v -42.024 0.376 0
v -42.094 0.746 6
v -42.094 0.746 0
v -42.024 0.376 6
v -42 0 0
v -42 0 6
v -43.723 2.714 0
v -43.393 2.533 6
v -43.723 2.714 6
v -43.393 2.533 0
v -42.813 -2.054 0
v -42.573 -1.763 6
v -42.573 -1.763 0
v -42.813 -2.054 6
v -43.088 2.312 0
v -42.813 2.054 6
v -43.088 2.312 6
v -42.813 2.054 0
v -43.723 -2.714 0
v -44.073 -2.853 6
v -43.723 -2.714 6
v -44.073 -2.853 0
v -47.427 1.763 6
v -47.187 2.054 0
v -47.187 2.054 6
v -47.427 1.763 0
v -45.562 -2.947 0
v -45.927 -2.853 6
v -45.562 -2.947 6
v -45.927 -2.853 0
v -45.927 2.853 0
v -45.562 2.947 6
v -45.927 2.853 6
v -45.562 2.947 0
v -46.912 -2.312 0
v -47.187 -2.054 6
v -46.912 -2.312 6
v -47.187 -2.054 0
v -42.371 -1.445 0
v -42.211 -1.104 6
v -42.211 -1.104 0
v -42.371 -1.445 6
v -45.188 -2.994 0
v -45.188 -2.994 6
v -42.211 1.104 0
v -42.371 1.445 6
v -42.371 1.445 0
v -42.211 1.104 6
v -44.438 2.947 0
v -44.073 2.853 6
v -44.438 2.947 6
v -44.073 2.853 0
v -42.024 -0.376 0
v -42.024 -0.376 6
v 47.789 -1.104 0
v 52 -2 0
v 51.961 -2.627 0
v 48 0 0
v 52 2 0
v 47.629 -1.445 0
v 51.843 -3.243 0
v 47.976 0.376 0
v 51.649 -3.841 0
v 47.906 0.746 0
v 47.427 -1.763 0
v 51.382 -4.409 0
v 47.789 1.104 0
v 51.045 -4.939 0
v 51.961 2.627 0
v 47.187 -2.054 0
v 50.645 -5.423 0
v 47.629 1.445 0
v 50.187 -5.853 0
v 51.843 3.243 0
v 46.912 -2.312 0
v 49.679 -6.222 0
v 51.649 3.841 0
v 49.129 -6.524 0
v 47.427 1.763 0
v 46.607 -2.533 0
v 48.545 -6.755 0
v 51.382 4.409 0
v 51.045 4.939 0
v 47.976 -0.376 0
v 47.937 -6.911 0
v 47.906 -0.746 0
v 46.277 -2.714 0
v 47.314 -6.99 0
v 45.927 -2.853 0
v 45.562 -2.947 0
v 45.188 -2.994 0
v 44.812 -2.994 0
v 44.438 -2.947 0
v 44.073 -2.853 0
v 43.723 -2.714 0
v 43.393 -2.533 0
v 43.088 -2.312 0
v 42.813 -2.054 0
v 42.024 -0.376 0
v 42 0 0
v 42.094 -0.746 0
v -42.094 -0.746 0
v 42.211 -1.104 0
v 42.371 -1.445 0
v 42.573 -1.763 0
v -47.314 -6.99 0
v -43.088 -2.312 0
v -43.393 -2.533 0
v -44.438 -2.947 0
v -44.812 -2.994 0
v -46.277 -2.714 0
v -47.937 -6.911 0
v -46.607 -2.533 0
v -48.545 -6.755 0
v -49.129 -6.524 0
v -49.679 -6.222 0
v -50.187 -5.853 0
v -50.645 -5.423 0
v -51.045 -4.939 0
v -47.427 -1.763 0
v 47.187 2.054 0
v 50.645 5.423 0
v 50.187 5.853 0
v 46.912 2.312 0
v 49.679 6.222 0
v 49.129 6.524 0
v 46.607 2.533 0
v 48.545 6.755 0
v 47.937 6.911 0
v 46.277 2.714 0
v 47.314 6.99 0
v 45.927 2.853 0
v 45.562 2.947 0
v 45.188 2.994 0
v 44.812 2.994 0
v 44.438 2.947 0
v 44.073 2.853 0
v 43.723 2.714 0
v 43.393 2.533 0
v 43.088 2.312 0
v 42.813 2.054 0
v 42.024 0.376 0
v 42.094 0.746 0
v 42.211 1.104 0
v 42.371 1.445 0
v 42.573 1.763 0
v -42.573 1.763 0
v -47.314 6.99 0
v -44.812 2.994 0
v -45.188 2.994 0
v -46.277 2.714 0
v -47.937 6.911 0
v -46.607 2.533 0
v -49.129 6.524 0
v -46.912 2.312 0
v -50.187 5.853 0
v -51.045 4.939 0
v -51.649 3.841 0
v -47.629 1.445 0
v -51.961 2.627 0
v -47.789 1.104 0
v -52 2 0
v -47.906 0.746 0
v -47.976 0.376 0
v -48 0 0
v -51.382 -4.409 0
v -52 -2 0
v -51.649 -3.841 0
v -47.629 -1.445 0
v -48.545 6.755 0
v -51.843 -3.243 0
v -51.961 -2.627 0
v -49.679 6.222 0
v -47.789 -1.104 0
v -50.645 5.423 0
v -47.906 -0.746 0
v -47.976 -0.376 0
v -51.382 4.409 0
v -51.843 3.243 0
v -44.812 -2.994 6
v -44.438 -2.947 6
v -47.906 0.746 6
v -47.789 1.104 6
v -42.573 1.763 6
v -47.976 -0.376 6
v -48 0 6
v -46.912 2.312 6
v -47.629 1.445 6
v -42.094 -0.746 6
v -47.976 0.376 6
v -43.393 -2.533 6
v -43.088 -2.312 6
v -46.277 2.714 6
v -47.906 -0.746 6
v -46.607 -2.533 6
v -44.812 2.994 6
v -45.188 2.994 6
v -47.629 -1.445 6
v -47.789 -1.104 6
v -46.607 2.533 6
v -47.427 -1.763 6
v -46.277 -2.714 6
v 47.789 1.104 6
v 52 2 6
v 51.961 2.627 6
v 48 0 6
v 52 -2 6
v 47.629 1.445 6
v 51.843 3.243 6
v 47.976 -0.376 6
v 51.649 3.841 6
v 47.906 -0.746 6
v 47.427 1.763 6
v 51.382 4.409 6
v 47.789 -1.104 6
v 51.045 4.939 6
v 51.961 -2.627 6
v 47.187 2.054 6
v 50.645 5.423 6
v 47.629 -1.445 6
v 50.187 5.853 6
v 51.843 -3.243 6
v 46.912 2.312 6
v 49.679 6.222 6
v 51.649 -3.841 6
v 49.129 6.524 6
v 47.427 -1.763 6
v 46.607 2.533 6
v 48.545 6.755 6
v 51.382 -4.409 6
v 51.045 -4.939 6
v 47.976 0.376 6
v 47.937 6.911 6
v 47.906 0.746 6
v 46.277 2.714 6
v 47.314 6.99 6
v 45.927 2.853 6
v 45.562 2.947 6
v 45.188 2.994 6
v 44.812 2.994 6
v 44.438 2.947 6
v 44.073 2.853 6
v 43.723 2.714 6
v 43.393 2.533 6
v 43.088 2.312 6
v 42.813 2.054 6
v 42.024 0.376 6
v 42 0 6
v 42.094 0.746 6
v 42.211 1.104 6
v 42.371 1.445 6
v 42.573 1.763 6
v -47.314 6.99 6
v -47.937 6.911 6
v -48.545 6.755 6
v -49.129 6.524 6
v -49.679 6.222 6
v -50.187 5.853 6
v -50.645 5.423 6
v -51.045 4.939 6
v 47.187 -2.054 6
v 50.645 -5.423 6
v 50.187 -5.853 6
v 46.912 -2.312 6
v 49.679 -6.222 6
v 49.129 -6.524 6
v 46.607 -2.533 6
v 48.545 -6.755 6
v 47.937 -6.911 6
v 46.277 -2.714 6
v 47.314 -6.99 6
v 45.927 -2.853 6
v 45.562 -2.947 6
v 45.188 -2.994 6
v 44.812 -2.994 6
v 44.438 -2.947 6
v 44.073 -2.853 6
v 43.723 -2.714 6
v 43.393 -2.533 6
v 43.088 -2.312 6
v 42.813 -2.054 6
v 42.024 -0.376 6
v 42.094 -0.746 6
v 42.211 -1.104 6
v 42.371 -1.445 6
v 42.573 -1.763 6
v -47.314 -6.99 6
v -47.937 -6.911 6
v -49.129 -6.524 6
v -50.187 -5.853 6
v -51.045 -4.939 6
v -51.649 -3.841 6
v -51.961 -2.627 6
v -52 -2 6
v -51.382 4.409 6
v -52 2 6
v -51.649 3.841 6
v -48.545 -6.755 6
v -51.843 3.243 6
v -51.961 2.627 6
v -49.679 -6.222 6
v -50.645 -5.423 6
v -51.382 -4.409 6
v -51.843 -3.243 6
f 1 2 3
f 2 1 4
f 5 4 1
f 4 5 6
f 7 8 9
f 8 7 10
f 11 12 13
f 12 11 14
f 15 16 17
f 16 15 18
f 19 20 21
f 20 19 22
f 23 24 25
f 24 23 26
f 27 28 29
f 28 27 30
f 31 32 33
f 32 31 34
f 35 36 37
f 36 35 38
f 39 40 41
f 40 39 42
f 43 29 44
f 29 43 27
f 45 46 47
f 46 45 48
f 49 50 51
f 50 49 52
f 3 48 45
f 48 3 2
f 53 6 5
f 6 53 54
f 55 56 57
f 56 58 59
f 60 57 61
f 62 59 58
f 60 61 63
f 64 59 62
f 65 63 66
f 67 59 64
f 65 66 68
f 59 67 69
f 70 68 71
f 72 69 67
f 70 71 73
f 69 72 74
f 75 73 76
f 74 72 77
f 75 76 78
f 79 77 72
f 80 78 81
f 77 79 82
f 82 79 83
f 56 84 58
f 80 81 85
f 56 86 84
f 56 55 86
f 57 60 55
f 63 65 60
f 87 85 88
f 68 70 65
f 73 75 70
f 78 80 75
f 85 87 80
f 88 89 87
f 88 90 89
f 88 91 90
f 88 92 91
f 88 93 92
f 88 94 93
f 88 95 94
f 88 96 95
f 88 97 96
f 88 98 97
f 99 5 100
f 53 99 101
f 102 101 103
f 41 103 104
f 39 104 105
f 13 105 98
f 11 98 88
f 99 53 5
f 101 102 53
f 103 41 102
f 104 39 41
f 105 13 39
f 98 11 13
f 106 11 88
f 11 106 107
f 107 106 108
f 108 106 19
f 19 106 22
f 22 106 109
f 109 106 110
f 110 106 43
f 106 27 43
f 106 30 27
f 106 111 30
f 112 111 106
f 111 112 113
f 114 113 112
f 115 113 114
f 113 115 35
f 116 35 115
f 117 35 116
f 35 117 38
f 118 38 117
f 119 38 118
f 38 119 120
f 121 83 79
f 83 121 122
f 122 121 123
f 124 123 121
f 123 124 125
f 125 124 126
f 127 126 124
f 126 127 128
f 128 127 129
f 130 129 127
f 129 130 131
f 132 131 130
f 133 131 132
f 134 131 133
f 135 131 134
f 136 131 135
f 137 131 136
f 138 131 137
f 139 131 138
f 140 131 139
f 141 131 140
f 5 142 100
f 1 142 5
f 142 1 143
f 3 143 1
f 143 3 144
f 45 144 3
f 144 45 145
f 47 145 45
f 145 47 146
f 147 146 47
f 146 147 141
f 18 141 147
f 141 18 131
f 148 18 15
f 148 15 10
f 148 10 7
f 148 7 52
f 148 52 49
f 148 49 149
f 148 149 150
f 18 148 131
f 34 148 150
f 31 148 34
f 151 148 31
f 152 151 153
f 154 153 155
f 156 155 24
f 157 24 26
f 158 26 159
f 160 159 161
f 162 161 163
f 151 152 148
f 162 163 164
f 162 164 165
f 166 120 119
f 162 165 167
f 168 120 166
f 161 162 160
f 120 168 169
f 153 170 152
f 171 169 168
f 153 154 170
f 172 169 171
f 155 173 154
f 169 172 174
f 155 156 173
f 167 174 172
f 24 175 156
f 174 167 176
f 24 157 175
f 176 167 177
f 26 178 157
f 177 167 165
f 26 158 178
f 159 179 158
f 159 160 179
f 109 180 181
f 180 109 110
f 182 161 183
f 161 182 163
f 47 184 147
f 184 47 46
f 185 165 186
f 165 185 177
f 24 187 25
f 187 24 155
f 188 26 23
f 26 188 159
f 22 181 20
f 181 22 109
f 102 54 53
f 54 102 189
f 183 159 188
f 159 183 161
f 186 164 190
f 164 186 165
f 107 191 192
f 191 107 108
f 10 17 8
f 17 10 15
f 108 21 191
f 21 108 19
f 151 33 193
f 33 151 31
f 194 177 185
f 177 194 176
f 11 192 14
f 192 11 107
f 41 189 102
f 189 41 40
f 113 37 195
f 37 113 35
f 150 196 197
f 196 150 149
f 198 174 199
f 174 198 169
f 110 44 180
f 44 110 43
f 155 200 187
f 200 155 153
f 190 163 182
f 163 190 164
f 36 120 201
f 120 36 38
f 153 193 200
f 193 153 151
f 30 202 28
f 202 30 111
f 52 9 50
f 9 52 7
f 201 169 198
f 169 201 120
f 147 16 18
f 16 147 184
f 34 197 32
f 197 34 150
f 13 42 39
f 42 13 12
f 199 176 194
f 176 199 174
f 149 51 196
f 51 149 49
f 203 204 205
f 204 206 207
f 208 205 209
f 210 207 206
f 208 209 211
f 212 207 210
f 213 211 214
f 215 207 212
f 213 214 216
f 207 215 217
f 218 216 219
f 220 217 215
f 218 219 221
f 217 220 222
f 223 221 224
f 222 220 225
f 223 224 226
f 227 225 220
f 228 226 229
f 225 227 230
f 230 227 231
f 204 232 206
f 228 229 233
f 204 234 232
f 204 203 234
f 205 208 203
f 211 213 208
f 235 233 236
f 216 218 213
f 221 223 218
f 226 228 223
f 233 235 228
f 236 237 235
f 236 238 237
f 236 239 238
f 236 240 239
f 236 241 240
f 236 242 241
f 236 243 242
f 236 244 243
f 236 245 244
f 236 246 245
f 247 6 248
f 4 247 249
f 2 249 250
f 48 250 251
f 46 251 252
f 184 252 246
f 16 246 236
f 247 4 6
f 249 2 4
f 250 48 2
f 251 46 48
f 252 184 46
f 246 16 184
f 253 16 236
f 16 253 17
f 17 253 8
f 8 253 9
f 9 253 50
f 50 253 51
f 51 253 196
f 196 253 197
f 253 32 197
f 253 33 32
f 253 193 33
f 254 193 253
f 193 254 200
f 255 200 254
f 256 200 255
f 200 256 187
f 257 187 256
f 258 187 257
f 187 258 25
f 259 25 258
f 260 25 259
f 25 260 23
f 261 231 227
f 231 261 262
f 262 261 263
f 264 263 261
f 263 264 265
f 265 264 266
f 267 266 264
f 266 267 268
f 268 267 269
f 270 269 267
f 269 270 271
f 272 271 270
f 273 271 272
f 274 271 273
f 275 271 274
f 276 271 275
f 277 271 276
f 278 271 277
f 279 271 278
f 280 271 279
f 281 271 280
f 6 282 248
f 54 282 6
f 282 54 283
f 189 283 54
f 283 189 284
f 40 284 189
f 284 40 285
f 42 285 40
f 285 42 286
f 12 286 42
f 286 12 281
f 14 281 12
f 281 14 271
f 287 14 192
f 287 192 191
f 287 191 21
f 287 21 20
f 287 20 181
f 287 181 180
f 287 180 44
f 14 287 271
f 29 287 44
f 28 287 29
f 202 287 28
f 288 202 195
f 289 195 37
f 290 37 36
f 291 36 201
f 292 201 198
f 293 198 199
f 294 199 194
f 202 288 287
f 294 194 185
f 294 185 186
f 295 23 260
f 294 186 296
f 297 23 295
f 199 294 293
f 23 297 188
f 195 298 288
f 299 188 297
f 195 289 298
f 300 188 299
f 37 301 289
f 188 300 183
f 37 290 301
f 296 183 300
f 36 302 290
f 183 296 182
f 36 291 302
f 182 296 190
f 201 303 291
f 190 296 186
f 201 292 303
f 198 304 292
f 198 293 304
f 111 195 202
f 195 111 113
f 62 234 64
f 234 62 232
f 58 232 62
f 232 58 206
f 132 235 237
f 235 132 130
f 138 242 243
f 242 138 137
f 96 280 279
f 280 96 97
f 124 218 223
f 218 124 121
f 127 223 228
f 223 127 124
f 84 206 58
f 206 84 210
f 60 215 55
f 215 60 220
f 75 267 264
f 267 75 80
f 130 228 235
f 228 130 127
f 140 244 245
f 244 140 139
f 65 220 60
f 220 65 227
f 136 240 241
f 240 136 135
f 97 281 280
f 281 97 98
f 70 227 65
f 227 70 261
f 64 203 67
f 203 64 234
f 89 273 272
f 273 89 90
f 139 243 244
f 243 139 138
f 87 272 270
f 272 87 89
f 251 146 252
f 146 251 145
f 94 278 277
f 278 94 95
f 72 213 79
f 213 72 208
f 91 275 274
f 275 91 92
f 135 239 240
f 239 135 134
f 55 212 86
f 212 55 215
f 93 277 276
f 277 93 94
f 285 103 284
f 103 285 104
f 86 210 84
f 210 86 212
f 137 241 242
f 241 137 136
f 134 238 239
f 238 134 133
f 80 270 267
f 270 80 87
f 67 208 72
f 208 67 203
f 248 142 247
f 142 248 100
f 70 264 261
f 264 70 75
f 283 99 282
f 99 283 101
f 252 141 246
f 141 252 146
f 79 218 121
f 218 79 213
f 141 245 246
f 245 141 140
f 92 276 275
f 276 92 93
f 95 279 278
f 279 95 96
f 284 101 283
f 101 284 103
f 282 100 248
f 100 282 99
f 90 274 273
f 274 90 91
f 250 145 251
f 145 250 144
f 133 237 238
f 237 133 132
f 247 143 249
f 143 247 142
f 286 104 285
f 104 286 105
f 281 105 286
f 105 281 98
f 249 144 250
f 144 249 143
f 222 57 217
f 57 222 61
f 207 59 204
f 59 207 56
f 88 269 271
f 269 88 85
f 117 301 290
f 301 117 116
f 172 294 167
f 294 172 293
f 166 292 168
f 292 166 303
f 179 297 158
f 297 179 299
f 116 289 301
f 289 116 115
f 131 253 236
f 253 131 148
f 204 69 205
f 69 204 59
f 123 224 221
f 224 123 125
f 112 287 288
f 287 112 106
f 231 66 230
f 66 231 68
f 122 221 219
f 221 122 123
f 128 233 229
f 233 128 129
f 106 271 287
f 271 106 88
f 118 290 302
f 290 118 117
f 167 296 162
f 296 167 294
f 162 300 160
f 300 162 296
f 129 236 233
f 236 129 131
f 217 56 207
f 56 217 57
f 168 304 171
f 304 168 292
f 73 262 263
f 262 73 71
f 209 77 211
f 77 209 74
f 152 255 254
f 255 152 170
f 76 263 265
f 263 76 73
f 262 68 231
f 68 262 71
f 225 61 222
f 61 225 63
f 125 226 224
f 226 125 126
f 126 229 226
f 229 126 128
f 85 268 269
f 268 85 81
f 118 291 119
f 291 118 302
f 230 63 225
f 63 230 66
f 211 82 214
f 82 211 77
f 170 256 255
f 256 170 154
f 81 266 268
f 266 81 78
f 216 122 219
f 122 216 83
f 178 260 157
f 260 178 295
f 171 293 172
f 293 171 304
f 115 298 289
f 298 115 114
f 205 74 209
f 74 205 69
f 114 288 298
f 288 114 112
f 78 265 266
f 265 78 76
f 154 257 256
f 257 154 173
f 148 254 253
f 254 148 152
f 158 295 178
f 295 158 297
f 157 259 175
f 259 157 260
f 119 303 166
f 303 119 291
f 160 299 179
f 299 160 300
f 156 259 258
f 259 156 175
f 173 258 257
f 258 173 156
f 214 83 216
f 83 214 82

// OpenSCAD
$fn = 50;


difference() {
	union() {
		hull() {
			translate(v = [-47.0000000000, 2.0000000000, 0]) {
				cylinder(h = 6, r = 5);
			}
			translate(v = [47.0000000000, 2.0000000000, 0]) {
				cylinder(h = 6, r = 5);
			}
			translate(v = [-47.0000000000, -2.0000000000, 0]) {
				cylinder(h = 6, r = 5);
			}
			translate(v = [47.0000000000, -2.0000000000, 0]) {
				cylinder(h = 6, r = 5);
			}
		}
	}
	union() {
		translate(v = [-45.0000000000, 0.0000000000, 0]) {
			cylinder(h = 6, r = 3.0000000000);
		}
		translate(v = [45.0000000000, 0.0000000000, 0]) {
			cylinder(h = 6, r = 3.0000000000);
		}
		translate(v = [-45.0000000000, 0.0000000000, 0]) {
			cylinder(h = 6, r = 1.5000000000);
		}
		translate(v = [45.0000000000, 0.0000000000, 0]) {
			cylinder(h = 6, r = 1.5000000000);
		}
		translate(v = [-45.0000000000, 0.0000000000, 0]) {
			cylinder(h = 6, r = 1.5000000000);
		}
		translate(v = [45.0000000000, 0.0000000000, 0]) {
			cylinder(h = 6, r = 1.5000000000);
		}
		translate(v = [-45.0000000000, 0.0000000000, 0]) {
			cylinder(h = 6, r = 1.5000000000);
		}
		translate(v = [45.0000000000, 0.0000000000, 0]) {
			cylinder(h = 6, r = 1.5000000000);
		}
	}
}
